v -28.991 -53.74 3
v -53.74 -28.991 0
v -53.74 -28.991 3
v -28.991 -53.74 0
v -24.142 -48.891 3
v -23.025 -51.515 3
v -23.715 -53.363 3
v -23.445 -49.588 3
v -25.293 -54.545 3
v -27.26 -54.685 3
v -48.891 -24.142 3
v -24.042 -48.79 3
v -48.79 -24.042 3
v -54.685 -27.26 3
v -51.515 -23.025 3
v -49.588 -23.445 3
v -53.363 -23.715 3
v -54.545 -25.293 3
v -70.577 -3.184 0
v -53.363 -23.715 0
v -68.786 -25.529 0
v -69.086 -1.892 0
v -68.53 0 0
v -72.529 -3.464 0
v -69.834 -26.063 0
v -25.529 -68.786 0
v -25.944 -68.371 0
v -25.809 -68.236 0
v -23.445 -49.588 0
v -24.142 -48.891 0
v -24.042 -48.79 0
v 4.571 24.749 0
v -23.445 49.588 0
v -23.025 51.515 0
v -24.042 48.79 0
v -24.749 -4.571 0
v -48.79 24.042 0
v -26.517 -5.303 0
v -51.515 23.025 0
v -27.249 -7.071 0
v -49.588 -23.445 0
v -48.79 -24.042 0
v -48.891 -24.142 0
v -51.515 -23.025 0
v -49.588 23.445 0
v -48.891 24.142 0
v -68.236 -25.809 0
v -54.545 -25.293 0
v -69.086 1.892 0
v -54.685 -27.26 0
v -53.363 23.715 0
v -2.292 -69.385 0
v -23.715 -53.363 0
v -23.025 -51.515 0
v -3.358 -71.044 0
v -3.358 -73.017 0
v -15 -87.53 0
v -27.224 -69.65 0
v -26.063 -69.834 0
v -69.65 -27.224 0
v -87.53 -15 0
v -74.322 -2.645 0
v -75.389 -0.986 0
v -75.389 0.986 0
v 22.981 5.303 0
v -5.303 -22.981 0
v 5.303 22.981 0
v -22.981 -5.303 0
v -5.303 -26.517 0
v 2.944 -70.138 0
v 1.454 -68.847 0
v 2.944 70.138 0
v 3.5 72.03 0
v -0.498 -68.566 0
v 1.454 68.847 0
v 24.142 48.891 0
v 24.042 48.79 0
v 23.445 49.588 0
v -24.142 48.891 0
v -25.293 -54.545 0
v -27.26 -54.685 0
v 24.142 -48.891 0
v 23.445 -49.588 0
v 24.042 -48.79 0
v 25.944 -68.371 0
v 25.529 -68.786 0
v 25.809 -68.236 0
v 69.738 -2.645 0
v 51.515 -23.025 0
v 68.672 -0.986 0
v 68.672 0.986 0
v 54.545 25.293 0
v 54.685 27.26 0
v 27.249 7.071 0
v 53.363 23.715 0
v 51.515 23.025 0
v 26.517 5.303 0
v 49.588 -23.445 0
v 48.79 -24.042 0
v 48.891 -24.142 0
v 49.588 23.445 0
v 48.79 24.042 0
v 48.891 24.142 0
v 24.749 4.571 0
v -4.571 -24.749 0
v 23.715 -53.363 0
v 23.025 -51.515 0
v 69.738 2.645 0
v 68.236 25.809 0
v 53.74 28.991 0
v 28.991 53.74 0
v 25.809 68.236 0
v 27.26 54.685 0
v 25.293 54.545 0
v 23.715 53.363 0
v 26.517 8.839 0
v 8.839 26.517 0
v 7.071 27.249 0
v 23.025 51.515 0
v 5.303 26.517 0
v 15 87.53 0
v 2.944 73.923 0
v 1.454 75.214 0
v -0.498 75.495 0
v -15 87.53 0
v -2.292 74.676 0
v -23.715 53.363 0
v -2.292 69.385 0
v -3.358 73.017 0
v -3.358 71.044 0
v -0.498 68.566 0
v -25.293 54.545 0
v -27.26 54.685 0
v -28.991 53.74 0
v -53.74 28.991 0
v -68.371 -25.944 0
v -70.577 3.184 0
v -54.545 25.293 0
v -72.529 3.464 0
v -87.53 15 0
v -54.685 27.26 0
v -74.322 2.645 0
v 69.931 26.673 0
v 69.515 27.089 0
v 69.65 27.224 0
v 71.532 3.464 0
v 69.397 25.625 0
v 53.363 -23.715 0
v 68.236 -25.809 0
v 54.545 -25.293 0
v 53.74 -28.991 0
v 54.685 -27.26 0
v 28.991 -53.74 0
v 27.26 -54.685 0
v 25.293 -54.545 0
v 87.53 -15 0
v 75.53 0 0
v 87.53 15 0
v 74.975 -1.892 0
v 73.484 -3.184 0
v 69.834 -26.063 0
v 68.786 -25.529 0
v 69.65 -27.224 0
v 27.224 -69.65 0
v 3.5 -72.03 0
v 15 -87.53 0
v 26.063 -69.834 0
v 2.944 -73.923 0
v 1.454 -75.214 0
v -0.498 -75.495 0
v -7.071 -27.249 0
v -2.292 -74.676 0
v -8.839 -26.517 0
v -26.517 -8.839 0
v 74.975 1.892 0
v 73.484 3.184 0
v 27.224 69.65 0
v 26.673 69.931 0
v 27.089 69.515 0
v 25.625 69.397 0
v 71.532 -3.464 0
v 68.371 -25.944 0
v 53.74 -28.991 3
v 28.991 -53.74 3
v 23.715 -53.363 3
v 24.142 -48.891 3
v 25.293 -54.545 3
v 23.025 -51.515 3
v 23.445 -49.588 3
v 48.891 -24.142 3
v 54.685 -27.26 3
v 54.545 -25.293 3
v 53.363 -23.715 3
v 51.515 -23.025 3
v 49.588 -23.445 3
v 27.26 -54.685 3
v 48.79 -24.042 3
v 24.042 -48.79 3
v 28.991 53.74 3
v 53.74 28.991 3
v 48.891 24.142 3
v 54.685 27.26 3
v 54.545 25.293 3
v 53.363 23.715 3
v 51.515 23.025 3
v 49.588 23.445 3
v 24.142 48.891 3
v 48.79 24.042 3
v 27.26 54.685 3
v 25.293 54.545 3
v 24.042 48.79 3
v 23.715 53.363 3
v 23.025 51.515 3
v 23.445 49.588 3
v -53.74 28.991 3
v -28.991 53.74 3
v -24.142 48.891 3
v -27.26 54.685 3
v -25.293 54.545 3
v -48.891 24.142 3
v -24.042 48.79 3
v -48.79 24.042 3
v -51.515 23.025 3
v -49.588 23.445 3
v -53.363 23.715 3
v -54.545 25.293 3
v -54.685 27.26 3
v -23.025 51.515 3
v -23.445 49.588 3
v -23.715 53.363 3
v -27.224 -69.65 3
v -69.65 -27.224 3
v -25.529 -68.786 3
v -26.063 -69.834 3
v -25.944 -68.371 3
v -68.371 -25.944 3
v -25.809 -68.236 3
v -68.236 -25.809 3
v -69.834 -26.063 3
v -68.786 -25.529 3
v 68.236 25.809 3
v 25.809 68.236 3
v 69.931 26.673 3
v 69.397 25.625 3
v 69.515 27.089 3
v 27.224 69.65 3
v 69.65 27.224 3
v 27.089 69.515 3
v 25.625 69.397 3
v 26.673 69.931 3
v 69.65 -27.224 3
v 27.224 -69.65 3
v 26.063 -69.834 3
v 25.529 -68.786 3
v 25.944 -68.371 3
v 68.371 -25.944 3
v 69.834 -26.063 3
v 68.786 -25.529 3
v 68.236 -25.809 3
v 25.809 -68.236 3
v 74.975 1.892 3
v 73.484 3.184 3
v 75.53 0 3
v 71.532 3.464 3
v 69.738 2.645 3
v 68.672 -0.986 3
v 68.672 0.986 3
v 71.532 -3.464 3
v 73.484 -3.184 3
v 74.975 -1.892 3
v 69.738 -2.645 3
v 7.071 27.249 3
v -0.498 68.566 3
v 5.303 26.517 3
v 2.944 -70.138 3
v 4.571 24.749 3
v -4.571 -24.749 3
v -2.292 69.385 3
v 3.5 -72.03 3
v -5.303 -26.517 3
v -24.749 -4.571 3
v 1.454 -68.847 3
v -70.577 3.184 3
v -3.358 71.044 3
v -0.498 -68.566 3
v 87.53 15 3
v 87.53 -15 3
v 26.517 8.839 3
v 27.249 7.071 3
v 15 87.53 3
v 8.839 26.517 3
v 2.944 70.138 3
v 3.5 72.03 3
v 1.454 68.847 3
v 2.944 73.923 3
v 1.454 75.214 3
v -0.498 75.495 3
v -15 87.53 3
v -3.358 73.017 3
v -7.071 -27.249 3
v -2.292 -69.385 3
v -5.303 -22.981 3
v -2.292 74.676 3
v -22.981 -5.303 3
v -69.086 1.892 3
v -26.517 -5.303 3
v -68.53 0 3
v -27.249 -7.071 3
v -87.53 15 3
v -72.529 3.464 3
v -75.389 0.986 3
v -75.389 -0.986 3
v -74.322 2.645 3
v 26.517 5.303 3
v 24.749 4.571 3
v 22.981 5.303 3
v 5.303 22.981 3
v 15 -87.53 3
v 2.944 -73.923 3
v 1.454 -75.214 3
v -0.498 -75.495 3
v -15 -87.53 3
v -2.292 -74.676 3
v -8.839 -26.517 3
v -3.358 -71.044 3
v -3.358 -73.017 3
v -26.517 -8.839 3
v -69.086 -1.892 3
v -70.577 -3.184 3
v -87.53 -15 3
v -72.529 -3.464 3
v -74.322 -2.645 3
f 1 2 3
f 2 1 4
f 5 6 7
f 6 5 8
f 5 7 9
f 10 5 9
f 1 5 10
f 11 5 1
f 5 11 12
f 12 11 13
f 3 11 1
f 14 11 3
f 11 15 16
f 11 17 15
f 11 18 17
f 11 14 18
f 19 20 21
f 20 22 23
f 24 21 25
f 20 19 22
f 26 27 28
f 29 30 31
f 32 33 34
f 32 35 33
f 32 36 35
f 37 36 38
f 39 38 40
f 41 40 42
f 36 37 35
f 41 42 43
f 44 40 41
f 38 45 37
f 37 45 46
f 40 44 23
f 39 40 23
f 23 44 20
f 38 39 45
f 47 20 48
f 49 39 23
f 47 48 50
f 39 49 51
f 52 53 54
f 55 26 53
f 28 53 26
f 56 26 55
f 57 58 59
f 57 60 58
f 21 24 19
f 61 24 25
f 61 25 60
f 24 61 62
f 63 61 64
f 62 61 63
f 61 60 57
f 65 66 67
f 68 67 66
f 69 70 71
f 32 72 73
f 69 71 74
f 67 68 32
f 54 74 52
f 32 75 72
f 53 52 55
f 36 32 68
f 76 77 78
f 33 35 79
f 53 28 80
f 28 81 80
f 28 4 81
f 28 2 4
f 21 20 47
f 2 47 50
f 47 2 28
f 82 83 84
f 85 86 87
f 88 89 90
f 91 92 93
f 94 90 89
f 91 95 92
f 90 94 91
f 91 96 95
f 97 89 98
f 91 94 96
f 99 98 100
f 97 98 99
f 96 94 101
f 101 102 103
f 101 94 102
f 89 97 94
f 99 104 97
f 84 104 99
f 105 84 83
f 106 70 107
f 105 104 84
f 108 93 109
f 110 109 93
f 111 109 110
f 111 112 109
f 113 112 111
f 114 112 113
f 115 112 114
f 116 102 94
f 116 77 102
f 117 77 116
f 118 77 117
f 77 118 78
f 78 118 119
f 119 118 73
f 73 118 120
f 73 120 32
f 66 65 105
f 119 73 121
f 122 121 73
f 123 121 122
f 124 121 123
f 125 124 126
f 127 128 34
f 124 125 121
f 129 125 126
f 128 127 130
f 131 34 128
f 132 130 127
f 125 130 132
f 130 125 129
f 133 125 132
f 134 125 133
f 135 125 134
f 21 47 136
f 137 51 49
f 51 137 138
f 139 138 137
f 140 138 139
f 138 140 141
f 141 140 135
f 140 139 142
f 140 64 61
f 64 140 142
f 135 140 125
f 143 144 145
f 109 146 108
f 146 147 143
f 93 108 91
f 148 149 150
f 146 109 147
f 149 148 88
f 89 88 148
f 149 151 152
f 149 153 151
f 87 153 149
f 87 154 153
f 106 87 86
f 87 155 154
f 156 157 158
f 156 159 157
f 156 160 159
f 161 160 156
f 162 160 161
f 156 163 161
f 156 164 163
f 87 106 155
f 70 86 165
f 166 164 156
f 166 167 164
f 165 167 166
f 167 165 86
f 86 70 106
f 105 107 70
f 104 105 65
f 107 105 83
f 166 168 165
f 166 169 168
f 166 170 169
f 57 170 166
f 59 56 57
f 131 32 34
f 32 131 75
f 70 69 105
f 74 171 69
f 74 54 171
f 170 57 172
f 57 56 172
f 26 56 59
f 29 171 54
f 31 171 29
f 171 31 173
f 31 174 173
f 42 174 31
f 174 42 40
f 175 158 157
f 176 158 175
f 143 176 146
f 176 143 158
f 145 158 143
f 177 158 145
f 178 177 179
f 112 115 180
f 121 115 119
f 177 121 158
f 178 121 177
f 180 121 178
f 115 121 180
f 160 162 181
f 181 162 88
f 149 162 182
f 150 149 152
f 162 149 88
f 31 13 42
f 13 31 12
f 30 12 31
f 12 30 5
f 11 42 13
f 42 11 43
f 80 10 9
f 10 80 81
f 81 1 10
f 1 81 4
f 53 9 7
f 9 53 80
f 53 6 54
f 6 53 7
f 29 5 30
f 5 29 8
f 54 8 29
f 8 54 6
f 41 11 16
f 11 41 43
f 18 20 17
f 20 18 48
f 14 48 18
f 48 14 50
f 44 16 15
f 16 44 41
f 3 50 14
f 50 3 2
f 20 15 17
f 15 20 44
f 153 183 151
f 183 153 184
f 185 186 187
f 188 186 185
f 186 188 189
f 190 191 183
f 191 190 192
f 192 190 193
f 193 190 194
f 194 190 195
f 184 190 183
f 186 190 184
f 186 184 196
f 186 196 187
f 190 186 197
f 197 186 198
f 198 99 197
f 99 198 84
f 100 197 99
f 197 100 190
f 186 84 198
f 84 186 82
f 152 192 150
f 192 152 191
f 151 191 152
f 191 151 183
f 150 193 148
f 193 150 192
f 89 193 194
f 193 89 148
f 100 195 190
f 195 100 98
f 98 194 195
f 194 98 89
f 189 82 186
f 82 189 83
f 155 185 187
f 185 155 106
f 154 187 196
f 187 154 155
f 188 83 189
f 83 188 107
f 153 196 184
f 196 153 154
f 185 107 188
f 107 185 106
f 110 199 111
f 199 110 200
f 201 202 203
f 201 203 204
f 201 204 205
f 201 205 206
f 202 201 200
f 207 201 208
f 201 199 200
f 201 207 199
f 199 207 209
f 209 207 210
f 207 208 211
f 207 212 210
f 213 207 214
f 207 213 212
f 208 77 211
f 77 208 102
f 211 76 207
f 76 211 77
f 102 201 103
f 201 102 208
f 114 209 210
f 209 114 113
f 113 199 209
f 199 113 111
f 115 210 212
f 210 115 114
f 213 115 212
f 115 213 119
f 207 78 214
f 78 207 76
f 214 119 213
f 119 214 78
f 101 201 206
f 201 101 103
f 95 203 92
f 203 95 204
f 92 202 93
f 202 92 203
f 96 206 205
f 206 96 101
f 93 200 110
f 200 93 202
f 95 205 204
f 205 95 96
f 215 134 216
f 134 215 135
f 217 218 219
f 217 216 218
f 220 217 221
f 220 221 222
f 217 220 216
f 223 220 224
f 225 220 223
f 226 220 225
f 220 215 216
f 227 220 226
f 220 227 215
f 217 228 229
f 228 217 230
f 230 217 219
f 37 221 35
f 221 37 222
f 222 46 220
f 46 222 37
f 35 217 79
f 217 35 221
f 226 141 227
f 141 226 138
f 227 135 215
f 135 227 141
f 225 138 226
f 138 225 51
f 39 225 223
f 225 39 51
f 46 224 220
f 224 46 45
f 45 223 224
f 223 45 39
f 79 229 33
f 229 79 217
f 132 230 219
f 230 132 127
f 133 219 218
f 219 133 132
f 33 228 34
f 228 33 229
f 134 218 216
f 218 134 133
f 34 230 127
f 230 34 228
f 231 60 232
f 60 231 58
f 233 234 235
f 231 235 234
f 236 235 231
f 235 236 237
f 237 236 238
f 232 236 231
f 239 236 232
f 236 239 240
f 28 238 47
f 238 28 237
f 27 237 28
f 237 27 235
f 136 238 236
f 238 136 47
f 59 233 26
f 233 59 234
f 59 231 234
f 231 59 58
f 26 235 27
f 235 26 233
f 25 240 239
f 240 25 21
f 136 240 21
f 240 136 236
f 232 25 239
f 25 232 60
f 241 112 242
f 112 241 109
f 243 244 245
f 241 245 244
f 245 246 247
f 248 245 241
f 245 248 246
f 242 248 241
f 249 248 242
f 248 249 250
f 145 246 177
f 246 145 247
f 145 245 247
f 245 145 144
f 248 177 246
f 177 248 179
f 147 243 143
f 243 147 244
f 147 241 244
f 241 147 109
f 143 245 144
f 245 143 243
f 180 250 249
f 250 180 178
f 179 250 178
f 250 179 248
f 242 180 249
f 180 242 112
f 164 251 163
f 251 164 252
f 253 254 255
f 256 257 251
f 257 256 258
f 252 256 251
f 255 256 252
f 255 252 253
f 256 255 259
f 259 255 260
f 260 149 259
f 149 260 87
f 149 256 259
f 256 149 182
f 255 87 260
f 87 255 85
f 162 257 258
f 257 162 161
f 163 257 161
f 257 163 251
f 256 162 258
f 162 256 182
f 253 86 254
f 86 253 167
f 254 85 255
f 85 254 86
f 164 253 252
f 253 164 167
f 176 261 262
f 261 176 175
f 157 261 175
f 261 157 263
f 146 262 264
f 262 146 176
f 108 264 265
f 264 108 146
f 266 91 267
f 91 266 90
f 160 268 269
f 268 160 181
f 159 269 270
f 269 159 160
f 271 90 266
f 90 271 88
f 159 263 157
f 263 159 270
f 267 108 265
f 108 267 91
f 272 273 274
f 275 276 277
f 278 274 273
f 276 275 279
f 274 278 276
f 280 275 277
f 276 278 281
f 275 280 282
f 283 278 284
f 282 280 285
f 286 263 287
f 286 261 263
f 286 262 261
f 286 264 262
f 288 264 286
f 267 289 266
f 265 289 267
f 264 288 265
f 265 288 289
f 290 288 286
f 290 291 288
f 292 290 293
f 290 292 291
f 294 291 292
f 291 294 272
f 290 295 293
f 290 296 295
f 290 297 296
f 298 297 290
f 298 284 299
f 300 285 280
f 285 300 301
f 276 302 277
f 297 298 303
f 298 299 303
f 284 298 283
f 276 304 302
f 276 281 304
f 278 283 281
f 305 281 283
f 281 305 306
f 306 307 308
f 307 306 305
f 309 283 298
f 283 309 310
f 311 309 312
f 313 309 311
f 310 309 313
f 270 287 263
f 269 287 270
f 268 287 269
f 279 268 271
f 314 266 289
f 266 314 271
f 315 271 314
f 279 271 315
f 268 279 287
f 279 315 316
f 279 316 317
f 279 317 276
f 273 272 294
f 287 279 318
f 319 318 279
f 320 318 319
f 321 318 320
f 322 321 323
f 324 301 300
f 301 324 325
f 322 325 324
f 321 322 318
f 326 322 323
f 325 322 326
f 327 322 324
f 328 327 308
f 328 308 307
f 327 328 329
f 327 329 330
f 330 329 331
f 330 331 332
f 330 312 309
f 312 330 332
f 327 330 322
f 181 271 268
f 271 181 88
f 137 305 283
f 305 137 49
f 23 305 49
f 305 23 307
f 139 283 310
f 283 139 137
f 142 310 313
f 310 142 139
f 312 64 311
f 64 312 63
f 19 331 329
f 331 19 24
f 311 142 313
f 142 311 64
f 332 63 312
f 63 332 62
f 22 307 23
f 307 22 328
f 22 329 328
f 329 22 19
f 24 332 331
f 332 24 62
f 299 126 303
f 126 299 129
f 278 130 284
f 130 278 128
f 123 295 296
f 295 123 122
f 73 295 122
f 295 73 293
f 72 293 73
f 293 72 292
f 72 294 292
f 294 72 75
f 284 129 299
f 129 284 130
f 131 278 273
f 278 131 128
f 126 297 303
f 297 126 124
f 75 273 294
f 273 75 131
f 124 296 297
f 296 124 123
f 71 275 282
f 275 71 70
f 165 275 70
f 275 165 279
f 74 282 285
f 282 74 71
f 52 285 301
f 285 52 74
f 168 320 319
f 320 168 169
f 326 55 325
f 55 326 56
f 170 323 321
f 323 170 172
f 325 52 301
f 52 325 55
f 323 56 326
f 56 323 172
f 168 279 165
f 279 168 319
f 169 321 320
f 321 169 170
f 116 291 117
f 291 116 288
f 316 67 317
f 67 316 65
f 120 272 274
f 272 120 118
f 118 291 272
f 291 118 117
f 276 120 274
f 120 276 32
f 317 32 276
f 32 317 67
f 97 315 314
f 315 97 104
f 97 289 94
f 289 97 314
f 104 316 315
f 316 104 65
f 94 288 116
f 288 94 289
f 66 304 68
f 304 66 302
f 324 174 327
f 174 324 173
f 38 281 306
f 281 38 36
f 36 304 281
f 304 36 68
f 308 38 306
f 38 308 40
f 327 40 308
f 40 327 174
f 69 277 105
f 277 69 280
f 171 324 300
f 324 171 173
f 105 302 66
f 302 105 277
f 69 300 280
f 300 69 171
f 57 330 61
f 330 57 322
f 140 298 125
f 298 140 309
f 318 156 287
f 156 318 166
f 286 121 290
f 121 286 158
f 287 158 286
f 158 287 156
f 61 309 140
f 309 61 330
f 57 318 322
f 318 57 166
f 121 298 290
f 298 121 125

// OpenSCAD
// file: common.scad
module M25Hole(x, y, z, depth) {
    translate([x, y, z]) {
        cylinder(h = depth, d = 2.5, center = true);
    }
}

module M6Hole(x, y, z, depth) {
    translate([x, y, z]) {
        cylinder(h = depth, d = 7.0, center = true);
    }
}

module Plate(plate_width, plate_depth) {
  difference() {
    // plate
    rotate(45) {
      translate([-plate_width / 2.0, -plate_width / 2.0, 0.0]) {
        cube([plate_width, plate_width, plate_depth]);
      }
    }

    // square cut plate corners
    A = plate_width;
    B = sqrt(2 * pow(A, 2));
    C = 30.0;
    D = 30.0;

    translate([B / 2.0, 0.0, plate_depth / 2.0]) {
      cube([C, D, plate_depth], true);
    }
    translate([-B / 2.0, 0.0, plate_depth / 2.0]) {
      cube([C, D, plate_depth], true);
    }
    translate([0.0, -B / 2.0, plate_depth / 2.0]) {
      cube([D, C, plate_depth], true);
    }
    translate([0.0, B/ 2.0, plate_depth / 2.0]) {
      cube([D, C, plate_depth], true);
    }

    // holes
    rotate(-135) {
      CableRoutingHoles(plate_width, plate_depth);
      CableFasteningHoles(plate_width, plate_depth);
    }
    ArmScrewHoles(plate_width, plate_depth, B - C);
    StackHoles(plate_width, plate_depth, B - C);
  }
}

module OdroidXU4MountHoles(plate_depth) {
    depth = 76;
    width = 52;

    rotate(45) {
        M25Hole(depth / 2.0, width / 2.0, 0.0, plate_depth * 2);
        M25Hole(-depth / 2.0, width / 2.0, 0.0, plate_depth * 2);
        M25Hole(depth / 2.0, -width / 2.0, 0.0, plate_depth * 2);
        M25Hole(-depth / 2.0, -width / 2.0, 0.0, plate_depth * 2);
    }
}

module StackHoles(plate_width, plate_depth, plate_diagonal) {
    between_line = 20.0;

    E = 5.5;
    F = (plate_diagonal / 2.0) - E;
    H = F - (between_line / 2.0);

    M6Hole(H, 0.0, plate_depth / 2.0, plate_depth);
    M6Hole(-H, 0.0, plate_depth / 2.0, plate_depth);
    M6Hole(0.0, H, plate_depth / 2.0, plate_depth);
    M6Hole(0.0, -H, plate_depth / 2.0, plate_depth);
}

module CableFasteningHoles(plate_width, plate_depth) {
  inner_width = plate_width - 10.0;
  hole_width = 60;
  hole_length = 2;

  translate([inner_width / 2.0, 0.0, plate_depth / 2.0]) {
    cube(size=[hole_length, hole_width, plate_depth], center=true);
    translate([0.0, hole_width / 2.0, -plate_depth / 2.0]) {
      cylinder(r=hole_length / 2.0, h=plate_depth, center=false);
    }
    translate([0.0, -hole_width / 2.0, -plate_depth / 2.0]) {
      cylinder(r=hole_length / 2.0, h=plate_depth, center=false);
    }
  }

  translate([-inner_width / 2.0, 0.0, plate_depth / 2.0]) {
    cube(size=[hole_length, hole_width, plate_depth], center=true);
    translate([0.0, hole_width / 2.0, -plate_depth / 2.0]) {
      cylinder(r=hole_length / 2.0, h=plate_depth, center=false);
    }
    translate([0.0, -hole_width / 2.0, -plate_depth / 2.0]) {
      cylinder(r=hole_length / 2.0, h=plate_depth, center=false);
    }
  }

  rotate(90) translate([inner_width / 2.0, 0.0, plate_depth / 2.0]) {
    cube(size=[hole_length, hole_width, plate_depth], center=true);
    translate([0.0, hole_width / 2.0, -plate_depth / 2.0]) {
      cylinder(r=hole_length / 2.0, h=plate_depth, center=false);
    }
    translate([0.0, -hole_width / 2.0, -plate_depth / 2.0]) {
      cylinder(r=hole_length / 2.0, h=plate_depth, center=false);
    }
  }
}

module CableRoutingHoles(plate_width, plate_depth) {
  routing_width = plate_width - 35.0;
  hole_width = 35;
  hole_length = 7;

  // inner cable fastening holes
  translate([routing_width / 2.0, 0.0, plate_depth / 2.0]) {
    cube(size=[hole_length, hole_width, plate_depth], center=true);
    translate([0.0, hole_width / 2.0, -plate_depth / 2.0]) {
      cylinder(r=hole_length / 2.0, h=plate_depth, center=false);
    }
    translate([0.0, -hole_width / 2.0, -plate_depth / 2.0]) {
      cylinder(r=hole_length / 2.0, h=plate_depth, center=false);
    }
  }

  rotate(90) translate([routing_width / 2.0, 0.0, plate_depth / 2.0]) {
    cube(size=[hole_length, hole_width, plate_depth], center=true);
    translate([0.0, hole_width / 2.0, -plate_depth / 2.0]) {
      cylinder(r=hole_length / 2.0, h=plate_depth, center=false);
    }
    translate([0.0, -hole_width / 2.0, -plate_depth / 2.0]) {
      cylinder(r=hole_length / 2.0, h=plate_depth, center=false);
    }
  }

  rotate(180) translate([routing_width / 2.0, 0.0, plate_depth / 2.0]) {
    cube(size=[hole_length, hole_width, plate_depth], center=true);
    translate([0.0, hole_width / 2.0, -plate_depth / 2.0]) {
      cylinder(r=hole_length / 2.0, h=plate_depth, center=false);
    }
    translate([0.0, -hole_width / 2.0, -plate_depth / 2.0]) {
      cylinder(r=hole_length / 2.0, h=plate_depth, center=false);
    }
  }
}

module BatteryStrapHoles(plate_width, plate_depth) {
  hole_width = 5;
  hole_length = 25;
  hole_between_width = 45;

  rotate(45) {
    translate([hole_between_width / 2.0, 0.0, plate_depth / 2.0]) {
      cube([hole_width, hole_length, plate_depth], center = true);
      translate([0.0, hole_length / 2.0, -plate_depth / 2.0]) {
        cylinder(r=hole_width / 2.0, h=plate_depth, center=false);
      }
      translate([0.0, -hole_length / 2.0, -plate_depth / 2.0]) {
        cylinder(r=hole_width / 2.0, h=plate_depth, center=false);
      }
    }
  }

  rotate(45) {
    translate([-hole_between_width / 2.0, 0.0, plate_depth / 2.0]) {
      cube([hole_width, hole_length, plate_depth], center = true);
      translate([0.0, hole_length / 2.0, -plate_depth / 2.0]) {
        cylinder(r=hole_width / 2.0, h=plate_depth, center=false);
      }
      translate([0.0, -hole_length / 2.0, -plate_depth / 2.0]) {
        cylinder(r=hole_width / 2.0, h=plate_depth, center=false);
      }
    }
  }
}

module LowerArmScrewHoles(plate_width, plate_depth, plate_diagonal) {
  base_line = 21.0;
  between_line = 20.0;

  E = 5.5;
  F = (plate_diagonal / 2.0) - E;
  G = F - between_line;

  // outer screw holes
  M25Hole(F, -base_line / 2.0, plate_depth / 2.0, plate_depth);
  M25Hole(F, base_line / 2.0, plate_depth / 2.0, plate_depth);

  M25Hole(-F, -base_line / 2.0, plate_depth / 2.0, plate_depth);
  M25Hole(-F, base_line / 2.0, plate_depth / 2.0, plate_depth);

  M25Hole(-base_line / 2.0, F, plate_depth / 2.0, plate_depth);
  M25Hole(base_line / 2.0, F, plate_depth / 2.0, plate_depth);

  M25Hole(-base_line / 2.0, -F, plate_depth / 2.0, plate_depth);
  M25Hole(base_line / 2.0, -F, plate_depth / 2.0, plate_depth);
}
// main file
use <common.scad>

// plate parameters
plate_width = 145.0;
plate_depth = 3.0;

battery_length = 146;
battery_width = 40;

module CableRoutingHoles(plate_width, plate_depth) {
  routing_width = plate_width - 35.0;
  hole_width = 35;
  hole_length = 7;

  // inner cable fastening holes
  translate([routing_width / 2.0, 0.0, plate_depth / 2.0]) {
    cube(size=[hole_length, hole_width, plate_depth], center=true);
    translate([0.0, hole_width / 2.0, -plate_depth / 2.0]) {
      cylinder(r=hole_length / 2.0, h=plate_depth, center=false);
    }
    translate([0.0, -hole_width / 2.0, -plate_depth / 2.0]) {
      cylinder(r=hole_length / 2.0, h=plate_depth, center=false);
    }
  }

  rotate(90) translate([routing_width / 2.0, 0.0, plate_depth / 2.0]) {
    cube(size=[hole_length, hole_width, plate_depth], center=true);
    translate([0.0, hole_width / 2.0, -plate_depth / 2.0]) {
      cylinder(r=hole_length / 2.0, h=plate_depth, center=false);
    }
    translate([0.0, -hole_width / 2.0, -plate_depth / 2.0]) {
      cylinder(r=hole_length / 2.0, h=plate_depth, center=false);
    }
  }

  rotate(180) translate([routing_width / 2.0, 0.0, plate_depth / 2.0]) {
    cube(size=[hole_length, hole_width, plate_depth], center=true);
    translate([0.0, hole_width / 2.0, -plate_depth / 2.0]) {
      cylinder(r=hole_length / 2.0, h=plate_depth, center=false);
    }
    translate([0.0, -hole_width / 2.0, -plate_depth / 2.0]) {
      cylinder(r=hole_length / 2.0, h=plate_depth, center=false);
    }
  }

  rotate(270) translate([routing_width / 2.0, 0.0, plate_depth / 2.0]) {
    cube(size=[hole_length, hole_width, plate_depth], center=true);
    translate([0.0, hole_width / 2.0, -plate_depth / 2.0]) {
      cylinder(r=hole_length / 2.0, h=plate_depth, center=false);
    }
    translate([0.0, -hole_width / 2.0, -plate_depth / 2.0]) {
      cylinder(r=hole_length / 2.0, h=plate_depth, center=false);
    }
  }
}

module BatteryPlate(plate_width, plate_depth) {
  difference() {
    // plate
    rotate(45) {
      translate([-plate_width / 2.0, -plate_width / 2.0, 0.0]) {
        cube([plate_width, plate_width, plate_depth]);
      }
    }

    // square cut plate corners
    A = plate_width;
    B = sqrt(2 * pow(A, 2));
    C = 30.0;
    D = 30.0;

    translate([B / 2.0, 0.0, plate_depth / 2.0]) {
      cube([C, D, plate_depth], true);
    }
    translate([-B / 2.0, 0.0, plate_depth / 2.0]) {
      cube([C, D, plate_depth], true);
    }
    translate([0.0, -B / 2.0, plate_depth / 2.0]) {
      cube([D, C, plate_depth], true);
    }
    translate([0.0, B/ 2.0, plate_depth / 2.0]) {
      cube([D, C, plate_depth], true);
    }

    // holes
    rotate(-135) {
      CableRoutingHoles(plate_width, plate_depth);
      CableFasteningHoles(plate_width, plate_depth);
    }
    StackHoles(plate_width, plate_depth, B - C);
    BatteryStrapHoles(plate_width, plate_depth);
  }
}

BatteryPlate(plate_width, plate_depth);
